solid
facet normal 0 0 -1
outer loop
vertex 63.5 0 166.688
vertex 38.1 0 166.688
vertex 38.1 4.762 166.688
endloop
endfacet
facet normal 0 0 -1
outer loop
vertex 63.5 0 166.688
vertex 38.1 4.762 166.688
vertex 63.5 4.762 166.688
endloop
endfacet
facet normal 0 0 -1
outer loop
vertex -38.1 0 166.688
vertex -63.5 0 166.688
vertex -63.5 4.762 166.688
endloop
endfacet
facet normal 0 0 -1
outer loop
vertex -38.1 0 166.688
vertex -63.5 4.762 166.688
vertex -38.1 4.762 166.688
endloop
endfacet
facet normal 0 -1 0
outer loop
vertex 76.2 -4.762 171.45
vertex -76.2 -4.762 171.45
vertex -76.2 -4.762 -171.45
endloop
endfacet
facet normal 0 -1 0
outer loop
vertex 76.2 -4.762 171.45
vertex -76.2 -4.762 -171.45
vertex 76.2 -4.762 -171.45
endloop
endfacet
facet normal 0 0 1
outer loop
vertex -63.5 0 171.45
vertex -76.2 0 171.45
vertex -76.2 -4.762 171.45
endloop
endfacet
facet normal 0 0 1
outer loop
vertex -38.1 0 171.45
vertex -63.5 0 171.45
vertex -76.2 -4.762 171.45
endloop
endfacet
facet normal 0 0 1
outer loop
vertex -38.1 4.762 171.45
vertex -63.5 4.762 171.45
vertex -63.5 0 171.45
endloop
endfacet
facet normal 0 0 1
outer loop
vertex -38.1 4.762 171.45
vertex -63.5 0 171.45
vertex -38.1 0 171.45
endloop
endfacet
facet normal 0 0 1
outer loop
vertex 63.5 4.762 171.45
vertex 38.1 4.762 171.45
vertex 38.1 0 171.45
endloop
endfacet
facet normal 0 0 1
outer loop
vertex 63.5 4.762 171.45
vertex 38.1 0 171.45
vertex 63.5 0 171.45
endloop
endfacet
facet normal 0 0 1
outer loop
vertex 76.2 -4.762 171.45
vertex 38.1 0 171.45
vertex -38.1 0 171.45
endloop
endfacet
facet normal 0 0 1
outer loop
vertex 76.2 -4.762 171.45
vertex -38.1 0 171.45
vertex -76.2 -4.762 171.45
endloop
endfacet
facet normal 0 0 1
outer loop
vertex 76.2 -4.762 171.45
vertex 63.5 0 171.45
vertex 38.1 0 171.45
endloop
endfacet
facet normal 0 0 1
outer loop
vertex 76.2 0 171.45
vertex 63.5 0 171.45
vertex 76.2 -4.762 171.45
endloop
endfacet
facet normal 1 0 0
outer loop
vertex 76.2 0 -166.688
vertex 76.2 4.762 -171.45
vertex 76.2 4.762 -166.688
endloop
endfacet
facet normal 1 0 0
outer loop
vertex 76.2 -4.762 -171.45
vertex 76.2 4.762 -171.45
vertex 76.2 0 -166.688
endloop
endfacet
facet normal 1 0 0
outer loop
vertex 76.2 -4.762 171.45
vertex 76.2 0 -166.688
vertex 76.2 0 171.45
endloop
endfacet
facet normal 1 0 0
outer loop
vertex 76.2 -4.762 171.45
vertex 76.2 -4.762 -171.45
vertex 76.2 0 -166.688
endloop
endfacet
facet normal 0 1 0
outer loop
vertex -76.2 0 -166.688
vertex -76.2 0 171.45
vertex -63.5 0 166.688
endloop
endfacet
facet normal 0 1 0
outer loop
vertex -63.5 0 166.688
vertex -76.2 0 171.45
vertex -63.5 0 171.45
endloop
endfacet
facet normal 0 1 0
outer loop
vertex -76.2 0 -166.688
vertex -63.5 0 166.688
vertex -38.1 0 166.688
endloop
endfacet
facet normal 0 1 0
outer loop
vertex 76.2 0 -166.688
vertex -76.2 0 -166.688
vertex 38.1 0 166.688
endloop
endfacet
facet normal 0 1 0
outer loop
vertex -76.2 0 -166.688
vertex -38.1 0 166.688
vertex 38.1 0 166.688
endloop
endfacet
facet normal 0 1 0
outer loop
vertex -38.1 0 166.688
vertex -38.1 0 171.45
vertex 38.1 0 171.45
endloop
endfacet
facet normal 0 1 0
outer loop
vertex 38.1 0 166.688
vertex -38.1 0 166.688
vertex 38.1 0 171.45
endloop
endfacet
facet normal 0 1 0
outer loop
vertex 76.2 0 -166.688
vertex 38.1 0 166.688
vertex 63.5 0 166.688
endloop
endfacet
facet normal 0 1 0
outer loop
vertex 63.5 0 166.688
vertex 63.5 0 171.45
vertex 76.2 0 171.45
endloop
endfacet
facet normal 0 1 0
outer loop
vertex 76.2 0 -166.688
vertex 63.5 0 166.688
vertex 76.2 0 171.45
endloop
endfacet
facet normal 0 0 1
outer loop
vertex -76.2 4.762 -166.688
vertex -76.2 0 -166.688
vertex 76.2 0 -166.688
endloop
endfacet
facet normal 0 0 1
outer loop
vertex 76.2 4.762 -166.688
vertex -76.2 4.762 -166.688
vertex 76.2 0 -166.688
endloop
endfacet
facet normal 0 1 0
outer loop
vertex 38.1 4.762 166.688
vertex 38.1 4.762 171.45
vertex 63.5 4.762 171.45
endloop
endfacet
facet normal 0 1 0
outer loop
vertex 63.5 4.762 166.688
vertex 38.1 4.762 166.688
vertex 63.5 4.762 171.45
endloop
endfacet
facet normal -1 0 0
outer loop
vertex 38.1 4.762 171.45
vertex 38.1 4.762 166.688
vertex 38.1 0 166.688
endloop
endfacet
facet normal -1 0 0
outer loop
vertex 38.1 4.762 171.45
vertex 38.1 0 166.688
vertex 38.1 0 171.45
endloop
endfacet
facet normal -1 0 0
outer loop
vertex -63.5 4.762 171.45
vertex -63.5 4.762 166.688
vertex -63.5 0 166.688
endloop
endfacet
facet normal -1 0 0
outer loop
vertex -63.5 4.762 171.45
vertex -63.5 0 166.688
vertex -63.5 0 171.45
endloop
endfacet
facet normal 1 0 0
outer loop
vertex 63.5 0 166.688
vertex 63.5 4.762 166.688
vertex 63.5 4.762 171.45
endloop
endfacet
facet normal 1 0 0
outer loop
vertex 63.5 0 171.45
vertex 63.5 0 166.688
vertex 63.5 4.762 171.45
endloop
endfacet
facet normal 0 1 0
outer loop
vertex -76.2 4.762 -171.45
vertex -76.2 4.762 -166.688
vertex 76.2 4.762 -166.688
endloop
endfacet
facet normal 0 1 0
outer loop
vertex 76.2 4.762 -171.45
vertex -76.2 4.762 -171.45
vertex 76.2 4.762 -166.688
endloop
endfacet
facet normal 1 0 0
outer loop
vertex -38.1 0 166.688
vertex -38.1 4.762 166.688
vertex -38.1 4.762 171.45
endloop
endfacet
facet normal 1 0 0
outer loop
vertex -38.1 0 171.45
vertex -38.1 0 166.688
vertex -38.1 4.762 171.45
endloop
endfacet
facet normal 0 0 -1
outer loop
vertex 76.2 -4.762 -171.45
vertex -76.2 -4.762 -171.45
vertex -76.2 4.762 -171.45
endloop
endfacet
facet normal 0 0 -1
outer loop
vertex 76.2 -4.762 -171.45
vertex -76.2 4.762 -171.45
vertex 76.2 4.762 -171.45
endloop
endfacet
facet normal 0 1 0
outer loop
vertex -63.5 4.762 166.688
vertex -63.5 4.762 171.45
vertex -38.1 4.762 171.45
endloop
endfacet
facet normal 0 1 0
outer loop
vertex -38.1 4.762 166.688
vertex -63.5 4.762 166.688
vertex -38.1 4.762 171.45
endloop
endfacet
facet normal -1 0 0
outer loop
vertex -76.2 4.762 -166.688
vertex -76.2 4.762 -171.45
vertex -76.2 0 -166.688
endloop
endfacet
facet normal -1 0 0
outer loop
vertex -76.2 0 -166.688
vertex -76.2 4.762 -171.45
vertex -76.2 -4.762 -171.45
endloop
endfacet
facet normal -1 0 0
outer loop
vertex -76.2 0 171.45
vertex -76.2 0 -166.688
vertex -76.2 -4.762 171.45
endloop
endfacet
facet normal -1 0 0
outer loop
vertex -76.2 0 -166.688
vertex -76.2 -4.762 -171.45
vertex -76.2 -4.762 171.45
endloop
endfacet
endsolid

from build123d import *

# Parameters (mm, degrees)
F0_W     = 152.4
F0_H     = 342.9
F1_DEPTH = 4.7625
F2_W     = 25.4
F2_H     = 4.7625
F3_DEPTH = 9.525
F4_W     = 152.4
F4_H     = 4.7625
F5_DEPTH = 9.525


with BuildPart() as f1:
    # F0 (on Front) → F1 (new body)
    with BuildSketch(Plane.XZ):
        Rectangle(F0_W, F0_H)
    extrude(amount=F1_DEPTH)

    # F2 (on face) → F3 (join)
    with BuildSketch(Plane.XZ.offset(4.7625)):
        with Locations((-50.8, 169.06875)):
            Rectangle(F2_W, F2_H)
        with Locations((50.8, 169.06875)):
            Rectangle(F2_W, F2_H)
    extrude(amount=-F3_DEPTH)

    # F4 (on face) → F5 (join)
    with BuildSketch(Plane.XZ.offset(4.7625)):
        with Locations((0, -169.06875)):
            Rectangle(F4_W, F4_H)
    extrude(amount=-F5_DEPTH)


solid = f1.part
